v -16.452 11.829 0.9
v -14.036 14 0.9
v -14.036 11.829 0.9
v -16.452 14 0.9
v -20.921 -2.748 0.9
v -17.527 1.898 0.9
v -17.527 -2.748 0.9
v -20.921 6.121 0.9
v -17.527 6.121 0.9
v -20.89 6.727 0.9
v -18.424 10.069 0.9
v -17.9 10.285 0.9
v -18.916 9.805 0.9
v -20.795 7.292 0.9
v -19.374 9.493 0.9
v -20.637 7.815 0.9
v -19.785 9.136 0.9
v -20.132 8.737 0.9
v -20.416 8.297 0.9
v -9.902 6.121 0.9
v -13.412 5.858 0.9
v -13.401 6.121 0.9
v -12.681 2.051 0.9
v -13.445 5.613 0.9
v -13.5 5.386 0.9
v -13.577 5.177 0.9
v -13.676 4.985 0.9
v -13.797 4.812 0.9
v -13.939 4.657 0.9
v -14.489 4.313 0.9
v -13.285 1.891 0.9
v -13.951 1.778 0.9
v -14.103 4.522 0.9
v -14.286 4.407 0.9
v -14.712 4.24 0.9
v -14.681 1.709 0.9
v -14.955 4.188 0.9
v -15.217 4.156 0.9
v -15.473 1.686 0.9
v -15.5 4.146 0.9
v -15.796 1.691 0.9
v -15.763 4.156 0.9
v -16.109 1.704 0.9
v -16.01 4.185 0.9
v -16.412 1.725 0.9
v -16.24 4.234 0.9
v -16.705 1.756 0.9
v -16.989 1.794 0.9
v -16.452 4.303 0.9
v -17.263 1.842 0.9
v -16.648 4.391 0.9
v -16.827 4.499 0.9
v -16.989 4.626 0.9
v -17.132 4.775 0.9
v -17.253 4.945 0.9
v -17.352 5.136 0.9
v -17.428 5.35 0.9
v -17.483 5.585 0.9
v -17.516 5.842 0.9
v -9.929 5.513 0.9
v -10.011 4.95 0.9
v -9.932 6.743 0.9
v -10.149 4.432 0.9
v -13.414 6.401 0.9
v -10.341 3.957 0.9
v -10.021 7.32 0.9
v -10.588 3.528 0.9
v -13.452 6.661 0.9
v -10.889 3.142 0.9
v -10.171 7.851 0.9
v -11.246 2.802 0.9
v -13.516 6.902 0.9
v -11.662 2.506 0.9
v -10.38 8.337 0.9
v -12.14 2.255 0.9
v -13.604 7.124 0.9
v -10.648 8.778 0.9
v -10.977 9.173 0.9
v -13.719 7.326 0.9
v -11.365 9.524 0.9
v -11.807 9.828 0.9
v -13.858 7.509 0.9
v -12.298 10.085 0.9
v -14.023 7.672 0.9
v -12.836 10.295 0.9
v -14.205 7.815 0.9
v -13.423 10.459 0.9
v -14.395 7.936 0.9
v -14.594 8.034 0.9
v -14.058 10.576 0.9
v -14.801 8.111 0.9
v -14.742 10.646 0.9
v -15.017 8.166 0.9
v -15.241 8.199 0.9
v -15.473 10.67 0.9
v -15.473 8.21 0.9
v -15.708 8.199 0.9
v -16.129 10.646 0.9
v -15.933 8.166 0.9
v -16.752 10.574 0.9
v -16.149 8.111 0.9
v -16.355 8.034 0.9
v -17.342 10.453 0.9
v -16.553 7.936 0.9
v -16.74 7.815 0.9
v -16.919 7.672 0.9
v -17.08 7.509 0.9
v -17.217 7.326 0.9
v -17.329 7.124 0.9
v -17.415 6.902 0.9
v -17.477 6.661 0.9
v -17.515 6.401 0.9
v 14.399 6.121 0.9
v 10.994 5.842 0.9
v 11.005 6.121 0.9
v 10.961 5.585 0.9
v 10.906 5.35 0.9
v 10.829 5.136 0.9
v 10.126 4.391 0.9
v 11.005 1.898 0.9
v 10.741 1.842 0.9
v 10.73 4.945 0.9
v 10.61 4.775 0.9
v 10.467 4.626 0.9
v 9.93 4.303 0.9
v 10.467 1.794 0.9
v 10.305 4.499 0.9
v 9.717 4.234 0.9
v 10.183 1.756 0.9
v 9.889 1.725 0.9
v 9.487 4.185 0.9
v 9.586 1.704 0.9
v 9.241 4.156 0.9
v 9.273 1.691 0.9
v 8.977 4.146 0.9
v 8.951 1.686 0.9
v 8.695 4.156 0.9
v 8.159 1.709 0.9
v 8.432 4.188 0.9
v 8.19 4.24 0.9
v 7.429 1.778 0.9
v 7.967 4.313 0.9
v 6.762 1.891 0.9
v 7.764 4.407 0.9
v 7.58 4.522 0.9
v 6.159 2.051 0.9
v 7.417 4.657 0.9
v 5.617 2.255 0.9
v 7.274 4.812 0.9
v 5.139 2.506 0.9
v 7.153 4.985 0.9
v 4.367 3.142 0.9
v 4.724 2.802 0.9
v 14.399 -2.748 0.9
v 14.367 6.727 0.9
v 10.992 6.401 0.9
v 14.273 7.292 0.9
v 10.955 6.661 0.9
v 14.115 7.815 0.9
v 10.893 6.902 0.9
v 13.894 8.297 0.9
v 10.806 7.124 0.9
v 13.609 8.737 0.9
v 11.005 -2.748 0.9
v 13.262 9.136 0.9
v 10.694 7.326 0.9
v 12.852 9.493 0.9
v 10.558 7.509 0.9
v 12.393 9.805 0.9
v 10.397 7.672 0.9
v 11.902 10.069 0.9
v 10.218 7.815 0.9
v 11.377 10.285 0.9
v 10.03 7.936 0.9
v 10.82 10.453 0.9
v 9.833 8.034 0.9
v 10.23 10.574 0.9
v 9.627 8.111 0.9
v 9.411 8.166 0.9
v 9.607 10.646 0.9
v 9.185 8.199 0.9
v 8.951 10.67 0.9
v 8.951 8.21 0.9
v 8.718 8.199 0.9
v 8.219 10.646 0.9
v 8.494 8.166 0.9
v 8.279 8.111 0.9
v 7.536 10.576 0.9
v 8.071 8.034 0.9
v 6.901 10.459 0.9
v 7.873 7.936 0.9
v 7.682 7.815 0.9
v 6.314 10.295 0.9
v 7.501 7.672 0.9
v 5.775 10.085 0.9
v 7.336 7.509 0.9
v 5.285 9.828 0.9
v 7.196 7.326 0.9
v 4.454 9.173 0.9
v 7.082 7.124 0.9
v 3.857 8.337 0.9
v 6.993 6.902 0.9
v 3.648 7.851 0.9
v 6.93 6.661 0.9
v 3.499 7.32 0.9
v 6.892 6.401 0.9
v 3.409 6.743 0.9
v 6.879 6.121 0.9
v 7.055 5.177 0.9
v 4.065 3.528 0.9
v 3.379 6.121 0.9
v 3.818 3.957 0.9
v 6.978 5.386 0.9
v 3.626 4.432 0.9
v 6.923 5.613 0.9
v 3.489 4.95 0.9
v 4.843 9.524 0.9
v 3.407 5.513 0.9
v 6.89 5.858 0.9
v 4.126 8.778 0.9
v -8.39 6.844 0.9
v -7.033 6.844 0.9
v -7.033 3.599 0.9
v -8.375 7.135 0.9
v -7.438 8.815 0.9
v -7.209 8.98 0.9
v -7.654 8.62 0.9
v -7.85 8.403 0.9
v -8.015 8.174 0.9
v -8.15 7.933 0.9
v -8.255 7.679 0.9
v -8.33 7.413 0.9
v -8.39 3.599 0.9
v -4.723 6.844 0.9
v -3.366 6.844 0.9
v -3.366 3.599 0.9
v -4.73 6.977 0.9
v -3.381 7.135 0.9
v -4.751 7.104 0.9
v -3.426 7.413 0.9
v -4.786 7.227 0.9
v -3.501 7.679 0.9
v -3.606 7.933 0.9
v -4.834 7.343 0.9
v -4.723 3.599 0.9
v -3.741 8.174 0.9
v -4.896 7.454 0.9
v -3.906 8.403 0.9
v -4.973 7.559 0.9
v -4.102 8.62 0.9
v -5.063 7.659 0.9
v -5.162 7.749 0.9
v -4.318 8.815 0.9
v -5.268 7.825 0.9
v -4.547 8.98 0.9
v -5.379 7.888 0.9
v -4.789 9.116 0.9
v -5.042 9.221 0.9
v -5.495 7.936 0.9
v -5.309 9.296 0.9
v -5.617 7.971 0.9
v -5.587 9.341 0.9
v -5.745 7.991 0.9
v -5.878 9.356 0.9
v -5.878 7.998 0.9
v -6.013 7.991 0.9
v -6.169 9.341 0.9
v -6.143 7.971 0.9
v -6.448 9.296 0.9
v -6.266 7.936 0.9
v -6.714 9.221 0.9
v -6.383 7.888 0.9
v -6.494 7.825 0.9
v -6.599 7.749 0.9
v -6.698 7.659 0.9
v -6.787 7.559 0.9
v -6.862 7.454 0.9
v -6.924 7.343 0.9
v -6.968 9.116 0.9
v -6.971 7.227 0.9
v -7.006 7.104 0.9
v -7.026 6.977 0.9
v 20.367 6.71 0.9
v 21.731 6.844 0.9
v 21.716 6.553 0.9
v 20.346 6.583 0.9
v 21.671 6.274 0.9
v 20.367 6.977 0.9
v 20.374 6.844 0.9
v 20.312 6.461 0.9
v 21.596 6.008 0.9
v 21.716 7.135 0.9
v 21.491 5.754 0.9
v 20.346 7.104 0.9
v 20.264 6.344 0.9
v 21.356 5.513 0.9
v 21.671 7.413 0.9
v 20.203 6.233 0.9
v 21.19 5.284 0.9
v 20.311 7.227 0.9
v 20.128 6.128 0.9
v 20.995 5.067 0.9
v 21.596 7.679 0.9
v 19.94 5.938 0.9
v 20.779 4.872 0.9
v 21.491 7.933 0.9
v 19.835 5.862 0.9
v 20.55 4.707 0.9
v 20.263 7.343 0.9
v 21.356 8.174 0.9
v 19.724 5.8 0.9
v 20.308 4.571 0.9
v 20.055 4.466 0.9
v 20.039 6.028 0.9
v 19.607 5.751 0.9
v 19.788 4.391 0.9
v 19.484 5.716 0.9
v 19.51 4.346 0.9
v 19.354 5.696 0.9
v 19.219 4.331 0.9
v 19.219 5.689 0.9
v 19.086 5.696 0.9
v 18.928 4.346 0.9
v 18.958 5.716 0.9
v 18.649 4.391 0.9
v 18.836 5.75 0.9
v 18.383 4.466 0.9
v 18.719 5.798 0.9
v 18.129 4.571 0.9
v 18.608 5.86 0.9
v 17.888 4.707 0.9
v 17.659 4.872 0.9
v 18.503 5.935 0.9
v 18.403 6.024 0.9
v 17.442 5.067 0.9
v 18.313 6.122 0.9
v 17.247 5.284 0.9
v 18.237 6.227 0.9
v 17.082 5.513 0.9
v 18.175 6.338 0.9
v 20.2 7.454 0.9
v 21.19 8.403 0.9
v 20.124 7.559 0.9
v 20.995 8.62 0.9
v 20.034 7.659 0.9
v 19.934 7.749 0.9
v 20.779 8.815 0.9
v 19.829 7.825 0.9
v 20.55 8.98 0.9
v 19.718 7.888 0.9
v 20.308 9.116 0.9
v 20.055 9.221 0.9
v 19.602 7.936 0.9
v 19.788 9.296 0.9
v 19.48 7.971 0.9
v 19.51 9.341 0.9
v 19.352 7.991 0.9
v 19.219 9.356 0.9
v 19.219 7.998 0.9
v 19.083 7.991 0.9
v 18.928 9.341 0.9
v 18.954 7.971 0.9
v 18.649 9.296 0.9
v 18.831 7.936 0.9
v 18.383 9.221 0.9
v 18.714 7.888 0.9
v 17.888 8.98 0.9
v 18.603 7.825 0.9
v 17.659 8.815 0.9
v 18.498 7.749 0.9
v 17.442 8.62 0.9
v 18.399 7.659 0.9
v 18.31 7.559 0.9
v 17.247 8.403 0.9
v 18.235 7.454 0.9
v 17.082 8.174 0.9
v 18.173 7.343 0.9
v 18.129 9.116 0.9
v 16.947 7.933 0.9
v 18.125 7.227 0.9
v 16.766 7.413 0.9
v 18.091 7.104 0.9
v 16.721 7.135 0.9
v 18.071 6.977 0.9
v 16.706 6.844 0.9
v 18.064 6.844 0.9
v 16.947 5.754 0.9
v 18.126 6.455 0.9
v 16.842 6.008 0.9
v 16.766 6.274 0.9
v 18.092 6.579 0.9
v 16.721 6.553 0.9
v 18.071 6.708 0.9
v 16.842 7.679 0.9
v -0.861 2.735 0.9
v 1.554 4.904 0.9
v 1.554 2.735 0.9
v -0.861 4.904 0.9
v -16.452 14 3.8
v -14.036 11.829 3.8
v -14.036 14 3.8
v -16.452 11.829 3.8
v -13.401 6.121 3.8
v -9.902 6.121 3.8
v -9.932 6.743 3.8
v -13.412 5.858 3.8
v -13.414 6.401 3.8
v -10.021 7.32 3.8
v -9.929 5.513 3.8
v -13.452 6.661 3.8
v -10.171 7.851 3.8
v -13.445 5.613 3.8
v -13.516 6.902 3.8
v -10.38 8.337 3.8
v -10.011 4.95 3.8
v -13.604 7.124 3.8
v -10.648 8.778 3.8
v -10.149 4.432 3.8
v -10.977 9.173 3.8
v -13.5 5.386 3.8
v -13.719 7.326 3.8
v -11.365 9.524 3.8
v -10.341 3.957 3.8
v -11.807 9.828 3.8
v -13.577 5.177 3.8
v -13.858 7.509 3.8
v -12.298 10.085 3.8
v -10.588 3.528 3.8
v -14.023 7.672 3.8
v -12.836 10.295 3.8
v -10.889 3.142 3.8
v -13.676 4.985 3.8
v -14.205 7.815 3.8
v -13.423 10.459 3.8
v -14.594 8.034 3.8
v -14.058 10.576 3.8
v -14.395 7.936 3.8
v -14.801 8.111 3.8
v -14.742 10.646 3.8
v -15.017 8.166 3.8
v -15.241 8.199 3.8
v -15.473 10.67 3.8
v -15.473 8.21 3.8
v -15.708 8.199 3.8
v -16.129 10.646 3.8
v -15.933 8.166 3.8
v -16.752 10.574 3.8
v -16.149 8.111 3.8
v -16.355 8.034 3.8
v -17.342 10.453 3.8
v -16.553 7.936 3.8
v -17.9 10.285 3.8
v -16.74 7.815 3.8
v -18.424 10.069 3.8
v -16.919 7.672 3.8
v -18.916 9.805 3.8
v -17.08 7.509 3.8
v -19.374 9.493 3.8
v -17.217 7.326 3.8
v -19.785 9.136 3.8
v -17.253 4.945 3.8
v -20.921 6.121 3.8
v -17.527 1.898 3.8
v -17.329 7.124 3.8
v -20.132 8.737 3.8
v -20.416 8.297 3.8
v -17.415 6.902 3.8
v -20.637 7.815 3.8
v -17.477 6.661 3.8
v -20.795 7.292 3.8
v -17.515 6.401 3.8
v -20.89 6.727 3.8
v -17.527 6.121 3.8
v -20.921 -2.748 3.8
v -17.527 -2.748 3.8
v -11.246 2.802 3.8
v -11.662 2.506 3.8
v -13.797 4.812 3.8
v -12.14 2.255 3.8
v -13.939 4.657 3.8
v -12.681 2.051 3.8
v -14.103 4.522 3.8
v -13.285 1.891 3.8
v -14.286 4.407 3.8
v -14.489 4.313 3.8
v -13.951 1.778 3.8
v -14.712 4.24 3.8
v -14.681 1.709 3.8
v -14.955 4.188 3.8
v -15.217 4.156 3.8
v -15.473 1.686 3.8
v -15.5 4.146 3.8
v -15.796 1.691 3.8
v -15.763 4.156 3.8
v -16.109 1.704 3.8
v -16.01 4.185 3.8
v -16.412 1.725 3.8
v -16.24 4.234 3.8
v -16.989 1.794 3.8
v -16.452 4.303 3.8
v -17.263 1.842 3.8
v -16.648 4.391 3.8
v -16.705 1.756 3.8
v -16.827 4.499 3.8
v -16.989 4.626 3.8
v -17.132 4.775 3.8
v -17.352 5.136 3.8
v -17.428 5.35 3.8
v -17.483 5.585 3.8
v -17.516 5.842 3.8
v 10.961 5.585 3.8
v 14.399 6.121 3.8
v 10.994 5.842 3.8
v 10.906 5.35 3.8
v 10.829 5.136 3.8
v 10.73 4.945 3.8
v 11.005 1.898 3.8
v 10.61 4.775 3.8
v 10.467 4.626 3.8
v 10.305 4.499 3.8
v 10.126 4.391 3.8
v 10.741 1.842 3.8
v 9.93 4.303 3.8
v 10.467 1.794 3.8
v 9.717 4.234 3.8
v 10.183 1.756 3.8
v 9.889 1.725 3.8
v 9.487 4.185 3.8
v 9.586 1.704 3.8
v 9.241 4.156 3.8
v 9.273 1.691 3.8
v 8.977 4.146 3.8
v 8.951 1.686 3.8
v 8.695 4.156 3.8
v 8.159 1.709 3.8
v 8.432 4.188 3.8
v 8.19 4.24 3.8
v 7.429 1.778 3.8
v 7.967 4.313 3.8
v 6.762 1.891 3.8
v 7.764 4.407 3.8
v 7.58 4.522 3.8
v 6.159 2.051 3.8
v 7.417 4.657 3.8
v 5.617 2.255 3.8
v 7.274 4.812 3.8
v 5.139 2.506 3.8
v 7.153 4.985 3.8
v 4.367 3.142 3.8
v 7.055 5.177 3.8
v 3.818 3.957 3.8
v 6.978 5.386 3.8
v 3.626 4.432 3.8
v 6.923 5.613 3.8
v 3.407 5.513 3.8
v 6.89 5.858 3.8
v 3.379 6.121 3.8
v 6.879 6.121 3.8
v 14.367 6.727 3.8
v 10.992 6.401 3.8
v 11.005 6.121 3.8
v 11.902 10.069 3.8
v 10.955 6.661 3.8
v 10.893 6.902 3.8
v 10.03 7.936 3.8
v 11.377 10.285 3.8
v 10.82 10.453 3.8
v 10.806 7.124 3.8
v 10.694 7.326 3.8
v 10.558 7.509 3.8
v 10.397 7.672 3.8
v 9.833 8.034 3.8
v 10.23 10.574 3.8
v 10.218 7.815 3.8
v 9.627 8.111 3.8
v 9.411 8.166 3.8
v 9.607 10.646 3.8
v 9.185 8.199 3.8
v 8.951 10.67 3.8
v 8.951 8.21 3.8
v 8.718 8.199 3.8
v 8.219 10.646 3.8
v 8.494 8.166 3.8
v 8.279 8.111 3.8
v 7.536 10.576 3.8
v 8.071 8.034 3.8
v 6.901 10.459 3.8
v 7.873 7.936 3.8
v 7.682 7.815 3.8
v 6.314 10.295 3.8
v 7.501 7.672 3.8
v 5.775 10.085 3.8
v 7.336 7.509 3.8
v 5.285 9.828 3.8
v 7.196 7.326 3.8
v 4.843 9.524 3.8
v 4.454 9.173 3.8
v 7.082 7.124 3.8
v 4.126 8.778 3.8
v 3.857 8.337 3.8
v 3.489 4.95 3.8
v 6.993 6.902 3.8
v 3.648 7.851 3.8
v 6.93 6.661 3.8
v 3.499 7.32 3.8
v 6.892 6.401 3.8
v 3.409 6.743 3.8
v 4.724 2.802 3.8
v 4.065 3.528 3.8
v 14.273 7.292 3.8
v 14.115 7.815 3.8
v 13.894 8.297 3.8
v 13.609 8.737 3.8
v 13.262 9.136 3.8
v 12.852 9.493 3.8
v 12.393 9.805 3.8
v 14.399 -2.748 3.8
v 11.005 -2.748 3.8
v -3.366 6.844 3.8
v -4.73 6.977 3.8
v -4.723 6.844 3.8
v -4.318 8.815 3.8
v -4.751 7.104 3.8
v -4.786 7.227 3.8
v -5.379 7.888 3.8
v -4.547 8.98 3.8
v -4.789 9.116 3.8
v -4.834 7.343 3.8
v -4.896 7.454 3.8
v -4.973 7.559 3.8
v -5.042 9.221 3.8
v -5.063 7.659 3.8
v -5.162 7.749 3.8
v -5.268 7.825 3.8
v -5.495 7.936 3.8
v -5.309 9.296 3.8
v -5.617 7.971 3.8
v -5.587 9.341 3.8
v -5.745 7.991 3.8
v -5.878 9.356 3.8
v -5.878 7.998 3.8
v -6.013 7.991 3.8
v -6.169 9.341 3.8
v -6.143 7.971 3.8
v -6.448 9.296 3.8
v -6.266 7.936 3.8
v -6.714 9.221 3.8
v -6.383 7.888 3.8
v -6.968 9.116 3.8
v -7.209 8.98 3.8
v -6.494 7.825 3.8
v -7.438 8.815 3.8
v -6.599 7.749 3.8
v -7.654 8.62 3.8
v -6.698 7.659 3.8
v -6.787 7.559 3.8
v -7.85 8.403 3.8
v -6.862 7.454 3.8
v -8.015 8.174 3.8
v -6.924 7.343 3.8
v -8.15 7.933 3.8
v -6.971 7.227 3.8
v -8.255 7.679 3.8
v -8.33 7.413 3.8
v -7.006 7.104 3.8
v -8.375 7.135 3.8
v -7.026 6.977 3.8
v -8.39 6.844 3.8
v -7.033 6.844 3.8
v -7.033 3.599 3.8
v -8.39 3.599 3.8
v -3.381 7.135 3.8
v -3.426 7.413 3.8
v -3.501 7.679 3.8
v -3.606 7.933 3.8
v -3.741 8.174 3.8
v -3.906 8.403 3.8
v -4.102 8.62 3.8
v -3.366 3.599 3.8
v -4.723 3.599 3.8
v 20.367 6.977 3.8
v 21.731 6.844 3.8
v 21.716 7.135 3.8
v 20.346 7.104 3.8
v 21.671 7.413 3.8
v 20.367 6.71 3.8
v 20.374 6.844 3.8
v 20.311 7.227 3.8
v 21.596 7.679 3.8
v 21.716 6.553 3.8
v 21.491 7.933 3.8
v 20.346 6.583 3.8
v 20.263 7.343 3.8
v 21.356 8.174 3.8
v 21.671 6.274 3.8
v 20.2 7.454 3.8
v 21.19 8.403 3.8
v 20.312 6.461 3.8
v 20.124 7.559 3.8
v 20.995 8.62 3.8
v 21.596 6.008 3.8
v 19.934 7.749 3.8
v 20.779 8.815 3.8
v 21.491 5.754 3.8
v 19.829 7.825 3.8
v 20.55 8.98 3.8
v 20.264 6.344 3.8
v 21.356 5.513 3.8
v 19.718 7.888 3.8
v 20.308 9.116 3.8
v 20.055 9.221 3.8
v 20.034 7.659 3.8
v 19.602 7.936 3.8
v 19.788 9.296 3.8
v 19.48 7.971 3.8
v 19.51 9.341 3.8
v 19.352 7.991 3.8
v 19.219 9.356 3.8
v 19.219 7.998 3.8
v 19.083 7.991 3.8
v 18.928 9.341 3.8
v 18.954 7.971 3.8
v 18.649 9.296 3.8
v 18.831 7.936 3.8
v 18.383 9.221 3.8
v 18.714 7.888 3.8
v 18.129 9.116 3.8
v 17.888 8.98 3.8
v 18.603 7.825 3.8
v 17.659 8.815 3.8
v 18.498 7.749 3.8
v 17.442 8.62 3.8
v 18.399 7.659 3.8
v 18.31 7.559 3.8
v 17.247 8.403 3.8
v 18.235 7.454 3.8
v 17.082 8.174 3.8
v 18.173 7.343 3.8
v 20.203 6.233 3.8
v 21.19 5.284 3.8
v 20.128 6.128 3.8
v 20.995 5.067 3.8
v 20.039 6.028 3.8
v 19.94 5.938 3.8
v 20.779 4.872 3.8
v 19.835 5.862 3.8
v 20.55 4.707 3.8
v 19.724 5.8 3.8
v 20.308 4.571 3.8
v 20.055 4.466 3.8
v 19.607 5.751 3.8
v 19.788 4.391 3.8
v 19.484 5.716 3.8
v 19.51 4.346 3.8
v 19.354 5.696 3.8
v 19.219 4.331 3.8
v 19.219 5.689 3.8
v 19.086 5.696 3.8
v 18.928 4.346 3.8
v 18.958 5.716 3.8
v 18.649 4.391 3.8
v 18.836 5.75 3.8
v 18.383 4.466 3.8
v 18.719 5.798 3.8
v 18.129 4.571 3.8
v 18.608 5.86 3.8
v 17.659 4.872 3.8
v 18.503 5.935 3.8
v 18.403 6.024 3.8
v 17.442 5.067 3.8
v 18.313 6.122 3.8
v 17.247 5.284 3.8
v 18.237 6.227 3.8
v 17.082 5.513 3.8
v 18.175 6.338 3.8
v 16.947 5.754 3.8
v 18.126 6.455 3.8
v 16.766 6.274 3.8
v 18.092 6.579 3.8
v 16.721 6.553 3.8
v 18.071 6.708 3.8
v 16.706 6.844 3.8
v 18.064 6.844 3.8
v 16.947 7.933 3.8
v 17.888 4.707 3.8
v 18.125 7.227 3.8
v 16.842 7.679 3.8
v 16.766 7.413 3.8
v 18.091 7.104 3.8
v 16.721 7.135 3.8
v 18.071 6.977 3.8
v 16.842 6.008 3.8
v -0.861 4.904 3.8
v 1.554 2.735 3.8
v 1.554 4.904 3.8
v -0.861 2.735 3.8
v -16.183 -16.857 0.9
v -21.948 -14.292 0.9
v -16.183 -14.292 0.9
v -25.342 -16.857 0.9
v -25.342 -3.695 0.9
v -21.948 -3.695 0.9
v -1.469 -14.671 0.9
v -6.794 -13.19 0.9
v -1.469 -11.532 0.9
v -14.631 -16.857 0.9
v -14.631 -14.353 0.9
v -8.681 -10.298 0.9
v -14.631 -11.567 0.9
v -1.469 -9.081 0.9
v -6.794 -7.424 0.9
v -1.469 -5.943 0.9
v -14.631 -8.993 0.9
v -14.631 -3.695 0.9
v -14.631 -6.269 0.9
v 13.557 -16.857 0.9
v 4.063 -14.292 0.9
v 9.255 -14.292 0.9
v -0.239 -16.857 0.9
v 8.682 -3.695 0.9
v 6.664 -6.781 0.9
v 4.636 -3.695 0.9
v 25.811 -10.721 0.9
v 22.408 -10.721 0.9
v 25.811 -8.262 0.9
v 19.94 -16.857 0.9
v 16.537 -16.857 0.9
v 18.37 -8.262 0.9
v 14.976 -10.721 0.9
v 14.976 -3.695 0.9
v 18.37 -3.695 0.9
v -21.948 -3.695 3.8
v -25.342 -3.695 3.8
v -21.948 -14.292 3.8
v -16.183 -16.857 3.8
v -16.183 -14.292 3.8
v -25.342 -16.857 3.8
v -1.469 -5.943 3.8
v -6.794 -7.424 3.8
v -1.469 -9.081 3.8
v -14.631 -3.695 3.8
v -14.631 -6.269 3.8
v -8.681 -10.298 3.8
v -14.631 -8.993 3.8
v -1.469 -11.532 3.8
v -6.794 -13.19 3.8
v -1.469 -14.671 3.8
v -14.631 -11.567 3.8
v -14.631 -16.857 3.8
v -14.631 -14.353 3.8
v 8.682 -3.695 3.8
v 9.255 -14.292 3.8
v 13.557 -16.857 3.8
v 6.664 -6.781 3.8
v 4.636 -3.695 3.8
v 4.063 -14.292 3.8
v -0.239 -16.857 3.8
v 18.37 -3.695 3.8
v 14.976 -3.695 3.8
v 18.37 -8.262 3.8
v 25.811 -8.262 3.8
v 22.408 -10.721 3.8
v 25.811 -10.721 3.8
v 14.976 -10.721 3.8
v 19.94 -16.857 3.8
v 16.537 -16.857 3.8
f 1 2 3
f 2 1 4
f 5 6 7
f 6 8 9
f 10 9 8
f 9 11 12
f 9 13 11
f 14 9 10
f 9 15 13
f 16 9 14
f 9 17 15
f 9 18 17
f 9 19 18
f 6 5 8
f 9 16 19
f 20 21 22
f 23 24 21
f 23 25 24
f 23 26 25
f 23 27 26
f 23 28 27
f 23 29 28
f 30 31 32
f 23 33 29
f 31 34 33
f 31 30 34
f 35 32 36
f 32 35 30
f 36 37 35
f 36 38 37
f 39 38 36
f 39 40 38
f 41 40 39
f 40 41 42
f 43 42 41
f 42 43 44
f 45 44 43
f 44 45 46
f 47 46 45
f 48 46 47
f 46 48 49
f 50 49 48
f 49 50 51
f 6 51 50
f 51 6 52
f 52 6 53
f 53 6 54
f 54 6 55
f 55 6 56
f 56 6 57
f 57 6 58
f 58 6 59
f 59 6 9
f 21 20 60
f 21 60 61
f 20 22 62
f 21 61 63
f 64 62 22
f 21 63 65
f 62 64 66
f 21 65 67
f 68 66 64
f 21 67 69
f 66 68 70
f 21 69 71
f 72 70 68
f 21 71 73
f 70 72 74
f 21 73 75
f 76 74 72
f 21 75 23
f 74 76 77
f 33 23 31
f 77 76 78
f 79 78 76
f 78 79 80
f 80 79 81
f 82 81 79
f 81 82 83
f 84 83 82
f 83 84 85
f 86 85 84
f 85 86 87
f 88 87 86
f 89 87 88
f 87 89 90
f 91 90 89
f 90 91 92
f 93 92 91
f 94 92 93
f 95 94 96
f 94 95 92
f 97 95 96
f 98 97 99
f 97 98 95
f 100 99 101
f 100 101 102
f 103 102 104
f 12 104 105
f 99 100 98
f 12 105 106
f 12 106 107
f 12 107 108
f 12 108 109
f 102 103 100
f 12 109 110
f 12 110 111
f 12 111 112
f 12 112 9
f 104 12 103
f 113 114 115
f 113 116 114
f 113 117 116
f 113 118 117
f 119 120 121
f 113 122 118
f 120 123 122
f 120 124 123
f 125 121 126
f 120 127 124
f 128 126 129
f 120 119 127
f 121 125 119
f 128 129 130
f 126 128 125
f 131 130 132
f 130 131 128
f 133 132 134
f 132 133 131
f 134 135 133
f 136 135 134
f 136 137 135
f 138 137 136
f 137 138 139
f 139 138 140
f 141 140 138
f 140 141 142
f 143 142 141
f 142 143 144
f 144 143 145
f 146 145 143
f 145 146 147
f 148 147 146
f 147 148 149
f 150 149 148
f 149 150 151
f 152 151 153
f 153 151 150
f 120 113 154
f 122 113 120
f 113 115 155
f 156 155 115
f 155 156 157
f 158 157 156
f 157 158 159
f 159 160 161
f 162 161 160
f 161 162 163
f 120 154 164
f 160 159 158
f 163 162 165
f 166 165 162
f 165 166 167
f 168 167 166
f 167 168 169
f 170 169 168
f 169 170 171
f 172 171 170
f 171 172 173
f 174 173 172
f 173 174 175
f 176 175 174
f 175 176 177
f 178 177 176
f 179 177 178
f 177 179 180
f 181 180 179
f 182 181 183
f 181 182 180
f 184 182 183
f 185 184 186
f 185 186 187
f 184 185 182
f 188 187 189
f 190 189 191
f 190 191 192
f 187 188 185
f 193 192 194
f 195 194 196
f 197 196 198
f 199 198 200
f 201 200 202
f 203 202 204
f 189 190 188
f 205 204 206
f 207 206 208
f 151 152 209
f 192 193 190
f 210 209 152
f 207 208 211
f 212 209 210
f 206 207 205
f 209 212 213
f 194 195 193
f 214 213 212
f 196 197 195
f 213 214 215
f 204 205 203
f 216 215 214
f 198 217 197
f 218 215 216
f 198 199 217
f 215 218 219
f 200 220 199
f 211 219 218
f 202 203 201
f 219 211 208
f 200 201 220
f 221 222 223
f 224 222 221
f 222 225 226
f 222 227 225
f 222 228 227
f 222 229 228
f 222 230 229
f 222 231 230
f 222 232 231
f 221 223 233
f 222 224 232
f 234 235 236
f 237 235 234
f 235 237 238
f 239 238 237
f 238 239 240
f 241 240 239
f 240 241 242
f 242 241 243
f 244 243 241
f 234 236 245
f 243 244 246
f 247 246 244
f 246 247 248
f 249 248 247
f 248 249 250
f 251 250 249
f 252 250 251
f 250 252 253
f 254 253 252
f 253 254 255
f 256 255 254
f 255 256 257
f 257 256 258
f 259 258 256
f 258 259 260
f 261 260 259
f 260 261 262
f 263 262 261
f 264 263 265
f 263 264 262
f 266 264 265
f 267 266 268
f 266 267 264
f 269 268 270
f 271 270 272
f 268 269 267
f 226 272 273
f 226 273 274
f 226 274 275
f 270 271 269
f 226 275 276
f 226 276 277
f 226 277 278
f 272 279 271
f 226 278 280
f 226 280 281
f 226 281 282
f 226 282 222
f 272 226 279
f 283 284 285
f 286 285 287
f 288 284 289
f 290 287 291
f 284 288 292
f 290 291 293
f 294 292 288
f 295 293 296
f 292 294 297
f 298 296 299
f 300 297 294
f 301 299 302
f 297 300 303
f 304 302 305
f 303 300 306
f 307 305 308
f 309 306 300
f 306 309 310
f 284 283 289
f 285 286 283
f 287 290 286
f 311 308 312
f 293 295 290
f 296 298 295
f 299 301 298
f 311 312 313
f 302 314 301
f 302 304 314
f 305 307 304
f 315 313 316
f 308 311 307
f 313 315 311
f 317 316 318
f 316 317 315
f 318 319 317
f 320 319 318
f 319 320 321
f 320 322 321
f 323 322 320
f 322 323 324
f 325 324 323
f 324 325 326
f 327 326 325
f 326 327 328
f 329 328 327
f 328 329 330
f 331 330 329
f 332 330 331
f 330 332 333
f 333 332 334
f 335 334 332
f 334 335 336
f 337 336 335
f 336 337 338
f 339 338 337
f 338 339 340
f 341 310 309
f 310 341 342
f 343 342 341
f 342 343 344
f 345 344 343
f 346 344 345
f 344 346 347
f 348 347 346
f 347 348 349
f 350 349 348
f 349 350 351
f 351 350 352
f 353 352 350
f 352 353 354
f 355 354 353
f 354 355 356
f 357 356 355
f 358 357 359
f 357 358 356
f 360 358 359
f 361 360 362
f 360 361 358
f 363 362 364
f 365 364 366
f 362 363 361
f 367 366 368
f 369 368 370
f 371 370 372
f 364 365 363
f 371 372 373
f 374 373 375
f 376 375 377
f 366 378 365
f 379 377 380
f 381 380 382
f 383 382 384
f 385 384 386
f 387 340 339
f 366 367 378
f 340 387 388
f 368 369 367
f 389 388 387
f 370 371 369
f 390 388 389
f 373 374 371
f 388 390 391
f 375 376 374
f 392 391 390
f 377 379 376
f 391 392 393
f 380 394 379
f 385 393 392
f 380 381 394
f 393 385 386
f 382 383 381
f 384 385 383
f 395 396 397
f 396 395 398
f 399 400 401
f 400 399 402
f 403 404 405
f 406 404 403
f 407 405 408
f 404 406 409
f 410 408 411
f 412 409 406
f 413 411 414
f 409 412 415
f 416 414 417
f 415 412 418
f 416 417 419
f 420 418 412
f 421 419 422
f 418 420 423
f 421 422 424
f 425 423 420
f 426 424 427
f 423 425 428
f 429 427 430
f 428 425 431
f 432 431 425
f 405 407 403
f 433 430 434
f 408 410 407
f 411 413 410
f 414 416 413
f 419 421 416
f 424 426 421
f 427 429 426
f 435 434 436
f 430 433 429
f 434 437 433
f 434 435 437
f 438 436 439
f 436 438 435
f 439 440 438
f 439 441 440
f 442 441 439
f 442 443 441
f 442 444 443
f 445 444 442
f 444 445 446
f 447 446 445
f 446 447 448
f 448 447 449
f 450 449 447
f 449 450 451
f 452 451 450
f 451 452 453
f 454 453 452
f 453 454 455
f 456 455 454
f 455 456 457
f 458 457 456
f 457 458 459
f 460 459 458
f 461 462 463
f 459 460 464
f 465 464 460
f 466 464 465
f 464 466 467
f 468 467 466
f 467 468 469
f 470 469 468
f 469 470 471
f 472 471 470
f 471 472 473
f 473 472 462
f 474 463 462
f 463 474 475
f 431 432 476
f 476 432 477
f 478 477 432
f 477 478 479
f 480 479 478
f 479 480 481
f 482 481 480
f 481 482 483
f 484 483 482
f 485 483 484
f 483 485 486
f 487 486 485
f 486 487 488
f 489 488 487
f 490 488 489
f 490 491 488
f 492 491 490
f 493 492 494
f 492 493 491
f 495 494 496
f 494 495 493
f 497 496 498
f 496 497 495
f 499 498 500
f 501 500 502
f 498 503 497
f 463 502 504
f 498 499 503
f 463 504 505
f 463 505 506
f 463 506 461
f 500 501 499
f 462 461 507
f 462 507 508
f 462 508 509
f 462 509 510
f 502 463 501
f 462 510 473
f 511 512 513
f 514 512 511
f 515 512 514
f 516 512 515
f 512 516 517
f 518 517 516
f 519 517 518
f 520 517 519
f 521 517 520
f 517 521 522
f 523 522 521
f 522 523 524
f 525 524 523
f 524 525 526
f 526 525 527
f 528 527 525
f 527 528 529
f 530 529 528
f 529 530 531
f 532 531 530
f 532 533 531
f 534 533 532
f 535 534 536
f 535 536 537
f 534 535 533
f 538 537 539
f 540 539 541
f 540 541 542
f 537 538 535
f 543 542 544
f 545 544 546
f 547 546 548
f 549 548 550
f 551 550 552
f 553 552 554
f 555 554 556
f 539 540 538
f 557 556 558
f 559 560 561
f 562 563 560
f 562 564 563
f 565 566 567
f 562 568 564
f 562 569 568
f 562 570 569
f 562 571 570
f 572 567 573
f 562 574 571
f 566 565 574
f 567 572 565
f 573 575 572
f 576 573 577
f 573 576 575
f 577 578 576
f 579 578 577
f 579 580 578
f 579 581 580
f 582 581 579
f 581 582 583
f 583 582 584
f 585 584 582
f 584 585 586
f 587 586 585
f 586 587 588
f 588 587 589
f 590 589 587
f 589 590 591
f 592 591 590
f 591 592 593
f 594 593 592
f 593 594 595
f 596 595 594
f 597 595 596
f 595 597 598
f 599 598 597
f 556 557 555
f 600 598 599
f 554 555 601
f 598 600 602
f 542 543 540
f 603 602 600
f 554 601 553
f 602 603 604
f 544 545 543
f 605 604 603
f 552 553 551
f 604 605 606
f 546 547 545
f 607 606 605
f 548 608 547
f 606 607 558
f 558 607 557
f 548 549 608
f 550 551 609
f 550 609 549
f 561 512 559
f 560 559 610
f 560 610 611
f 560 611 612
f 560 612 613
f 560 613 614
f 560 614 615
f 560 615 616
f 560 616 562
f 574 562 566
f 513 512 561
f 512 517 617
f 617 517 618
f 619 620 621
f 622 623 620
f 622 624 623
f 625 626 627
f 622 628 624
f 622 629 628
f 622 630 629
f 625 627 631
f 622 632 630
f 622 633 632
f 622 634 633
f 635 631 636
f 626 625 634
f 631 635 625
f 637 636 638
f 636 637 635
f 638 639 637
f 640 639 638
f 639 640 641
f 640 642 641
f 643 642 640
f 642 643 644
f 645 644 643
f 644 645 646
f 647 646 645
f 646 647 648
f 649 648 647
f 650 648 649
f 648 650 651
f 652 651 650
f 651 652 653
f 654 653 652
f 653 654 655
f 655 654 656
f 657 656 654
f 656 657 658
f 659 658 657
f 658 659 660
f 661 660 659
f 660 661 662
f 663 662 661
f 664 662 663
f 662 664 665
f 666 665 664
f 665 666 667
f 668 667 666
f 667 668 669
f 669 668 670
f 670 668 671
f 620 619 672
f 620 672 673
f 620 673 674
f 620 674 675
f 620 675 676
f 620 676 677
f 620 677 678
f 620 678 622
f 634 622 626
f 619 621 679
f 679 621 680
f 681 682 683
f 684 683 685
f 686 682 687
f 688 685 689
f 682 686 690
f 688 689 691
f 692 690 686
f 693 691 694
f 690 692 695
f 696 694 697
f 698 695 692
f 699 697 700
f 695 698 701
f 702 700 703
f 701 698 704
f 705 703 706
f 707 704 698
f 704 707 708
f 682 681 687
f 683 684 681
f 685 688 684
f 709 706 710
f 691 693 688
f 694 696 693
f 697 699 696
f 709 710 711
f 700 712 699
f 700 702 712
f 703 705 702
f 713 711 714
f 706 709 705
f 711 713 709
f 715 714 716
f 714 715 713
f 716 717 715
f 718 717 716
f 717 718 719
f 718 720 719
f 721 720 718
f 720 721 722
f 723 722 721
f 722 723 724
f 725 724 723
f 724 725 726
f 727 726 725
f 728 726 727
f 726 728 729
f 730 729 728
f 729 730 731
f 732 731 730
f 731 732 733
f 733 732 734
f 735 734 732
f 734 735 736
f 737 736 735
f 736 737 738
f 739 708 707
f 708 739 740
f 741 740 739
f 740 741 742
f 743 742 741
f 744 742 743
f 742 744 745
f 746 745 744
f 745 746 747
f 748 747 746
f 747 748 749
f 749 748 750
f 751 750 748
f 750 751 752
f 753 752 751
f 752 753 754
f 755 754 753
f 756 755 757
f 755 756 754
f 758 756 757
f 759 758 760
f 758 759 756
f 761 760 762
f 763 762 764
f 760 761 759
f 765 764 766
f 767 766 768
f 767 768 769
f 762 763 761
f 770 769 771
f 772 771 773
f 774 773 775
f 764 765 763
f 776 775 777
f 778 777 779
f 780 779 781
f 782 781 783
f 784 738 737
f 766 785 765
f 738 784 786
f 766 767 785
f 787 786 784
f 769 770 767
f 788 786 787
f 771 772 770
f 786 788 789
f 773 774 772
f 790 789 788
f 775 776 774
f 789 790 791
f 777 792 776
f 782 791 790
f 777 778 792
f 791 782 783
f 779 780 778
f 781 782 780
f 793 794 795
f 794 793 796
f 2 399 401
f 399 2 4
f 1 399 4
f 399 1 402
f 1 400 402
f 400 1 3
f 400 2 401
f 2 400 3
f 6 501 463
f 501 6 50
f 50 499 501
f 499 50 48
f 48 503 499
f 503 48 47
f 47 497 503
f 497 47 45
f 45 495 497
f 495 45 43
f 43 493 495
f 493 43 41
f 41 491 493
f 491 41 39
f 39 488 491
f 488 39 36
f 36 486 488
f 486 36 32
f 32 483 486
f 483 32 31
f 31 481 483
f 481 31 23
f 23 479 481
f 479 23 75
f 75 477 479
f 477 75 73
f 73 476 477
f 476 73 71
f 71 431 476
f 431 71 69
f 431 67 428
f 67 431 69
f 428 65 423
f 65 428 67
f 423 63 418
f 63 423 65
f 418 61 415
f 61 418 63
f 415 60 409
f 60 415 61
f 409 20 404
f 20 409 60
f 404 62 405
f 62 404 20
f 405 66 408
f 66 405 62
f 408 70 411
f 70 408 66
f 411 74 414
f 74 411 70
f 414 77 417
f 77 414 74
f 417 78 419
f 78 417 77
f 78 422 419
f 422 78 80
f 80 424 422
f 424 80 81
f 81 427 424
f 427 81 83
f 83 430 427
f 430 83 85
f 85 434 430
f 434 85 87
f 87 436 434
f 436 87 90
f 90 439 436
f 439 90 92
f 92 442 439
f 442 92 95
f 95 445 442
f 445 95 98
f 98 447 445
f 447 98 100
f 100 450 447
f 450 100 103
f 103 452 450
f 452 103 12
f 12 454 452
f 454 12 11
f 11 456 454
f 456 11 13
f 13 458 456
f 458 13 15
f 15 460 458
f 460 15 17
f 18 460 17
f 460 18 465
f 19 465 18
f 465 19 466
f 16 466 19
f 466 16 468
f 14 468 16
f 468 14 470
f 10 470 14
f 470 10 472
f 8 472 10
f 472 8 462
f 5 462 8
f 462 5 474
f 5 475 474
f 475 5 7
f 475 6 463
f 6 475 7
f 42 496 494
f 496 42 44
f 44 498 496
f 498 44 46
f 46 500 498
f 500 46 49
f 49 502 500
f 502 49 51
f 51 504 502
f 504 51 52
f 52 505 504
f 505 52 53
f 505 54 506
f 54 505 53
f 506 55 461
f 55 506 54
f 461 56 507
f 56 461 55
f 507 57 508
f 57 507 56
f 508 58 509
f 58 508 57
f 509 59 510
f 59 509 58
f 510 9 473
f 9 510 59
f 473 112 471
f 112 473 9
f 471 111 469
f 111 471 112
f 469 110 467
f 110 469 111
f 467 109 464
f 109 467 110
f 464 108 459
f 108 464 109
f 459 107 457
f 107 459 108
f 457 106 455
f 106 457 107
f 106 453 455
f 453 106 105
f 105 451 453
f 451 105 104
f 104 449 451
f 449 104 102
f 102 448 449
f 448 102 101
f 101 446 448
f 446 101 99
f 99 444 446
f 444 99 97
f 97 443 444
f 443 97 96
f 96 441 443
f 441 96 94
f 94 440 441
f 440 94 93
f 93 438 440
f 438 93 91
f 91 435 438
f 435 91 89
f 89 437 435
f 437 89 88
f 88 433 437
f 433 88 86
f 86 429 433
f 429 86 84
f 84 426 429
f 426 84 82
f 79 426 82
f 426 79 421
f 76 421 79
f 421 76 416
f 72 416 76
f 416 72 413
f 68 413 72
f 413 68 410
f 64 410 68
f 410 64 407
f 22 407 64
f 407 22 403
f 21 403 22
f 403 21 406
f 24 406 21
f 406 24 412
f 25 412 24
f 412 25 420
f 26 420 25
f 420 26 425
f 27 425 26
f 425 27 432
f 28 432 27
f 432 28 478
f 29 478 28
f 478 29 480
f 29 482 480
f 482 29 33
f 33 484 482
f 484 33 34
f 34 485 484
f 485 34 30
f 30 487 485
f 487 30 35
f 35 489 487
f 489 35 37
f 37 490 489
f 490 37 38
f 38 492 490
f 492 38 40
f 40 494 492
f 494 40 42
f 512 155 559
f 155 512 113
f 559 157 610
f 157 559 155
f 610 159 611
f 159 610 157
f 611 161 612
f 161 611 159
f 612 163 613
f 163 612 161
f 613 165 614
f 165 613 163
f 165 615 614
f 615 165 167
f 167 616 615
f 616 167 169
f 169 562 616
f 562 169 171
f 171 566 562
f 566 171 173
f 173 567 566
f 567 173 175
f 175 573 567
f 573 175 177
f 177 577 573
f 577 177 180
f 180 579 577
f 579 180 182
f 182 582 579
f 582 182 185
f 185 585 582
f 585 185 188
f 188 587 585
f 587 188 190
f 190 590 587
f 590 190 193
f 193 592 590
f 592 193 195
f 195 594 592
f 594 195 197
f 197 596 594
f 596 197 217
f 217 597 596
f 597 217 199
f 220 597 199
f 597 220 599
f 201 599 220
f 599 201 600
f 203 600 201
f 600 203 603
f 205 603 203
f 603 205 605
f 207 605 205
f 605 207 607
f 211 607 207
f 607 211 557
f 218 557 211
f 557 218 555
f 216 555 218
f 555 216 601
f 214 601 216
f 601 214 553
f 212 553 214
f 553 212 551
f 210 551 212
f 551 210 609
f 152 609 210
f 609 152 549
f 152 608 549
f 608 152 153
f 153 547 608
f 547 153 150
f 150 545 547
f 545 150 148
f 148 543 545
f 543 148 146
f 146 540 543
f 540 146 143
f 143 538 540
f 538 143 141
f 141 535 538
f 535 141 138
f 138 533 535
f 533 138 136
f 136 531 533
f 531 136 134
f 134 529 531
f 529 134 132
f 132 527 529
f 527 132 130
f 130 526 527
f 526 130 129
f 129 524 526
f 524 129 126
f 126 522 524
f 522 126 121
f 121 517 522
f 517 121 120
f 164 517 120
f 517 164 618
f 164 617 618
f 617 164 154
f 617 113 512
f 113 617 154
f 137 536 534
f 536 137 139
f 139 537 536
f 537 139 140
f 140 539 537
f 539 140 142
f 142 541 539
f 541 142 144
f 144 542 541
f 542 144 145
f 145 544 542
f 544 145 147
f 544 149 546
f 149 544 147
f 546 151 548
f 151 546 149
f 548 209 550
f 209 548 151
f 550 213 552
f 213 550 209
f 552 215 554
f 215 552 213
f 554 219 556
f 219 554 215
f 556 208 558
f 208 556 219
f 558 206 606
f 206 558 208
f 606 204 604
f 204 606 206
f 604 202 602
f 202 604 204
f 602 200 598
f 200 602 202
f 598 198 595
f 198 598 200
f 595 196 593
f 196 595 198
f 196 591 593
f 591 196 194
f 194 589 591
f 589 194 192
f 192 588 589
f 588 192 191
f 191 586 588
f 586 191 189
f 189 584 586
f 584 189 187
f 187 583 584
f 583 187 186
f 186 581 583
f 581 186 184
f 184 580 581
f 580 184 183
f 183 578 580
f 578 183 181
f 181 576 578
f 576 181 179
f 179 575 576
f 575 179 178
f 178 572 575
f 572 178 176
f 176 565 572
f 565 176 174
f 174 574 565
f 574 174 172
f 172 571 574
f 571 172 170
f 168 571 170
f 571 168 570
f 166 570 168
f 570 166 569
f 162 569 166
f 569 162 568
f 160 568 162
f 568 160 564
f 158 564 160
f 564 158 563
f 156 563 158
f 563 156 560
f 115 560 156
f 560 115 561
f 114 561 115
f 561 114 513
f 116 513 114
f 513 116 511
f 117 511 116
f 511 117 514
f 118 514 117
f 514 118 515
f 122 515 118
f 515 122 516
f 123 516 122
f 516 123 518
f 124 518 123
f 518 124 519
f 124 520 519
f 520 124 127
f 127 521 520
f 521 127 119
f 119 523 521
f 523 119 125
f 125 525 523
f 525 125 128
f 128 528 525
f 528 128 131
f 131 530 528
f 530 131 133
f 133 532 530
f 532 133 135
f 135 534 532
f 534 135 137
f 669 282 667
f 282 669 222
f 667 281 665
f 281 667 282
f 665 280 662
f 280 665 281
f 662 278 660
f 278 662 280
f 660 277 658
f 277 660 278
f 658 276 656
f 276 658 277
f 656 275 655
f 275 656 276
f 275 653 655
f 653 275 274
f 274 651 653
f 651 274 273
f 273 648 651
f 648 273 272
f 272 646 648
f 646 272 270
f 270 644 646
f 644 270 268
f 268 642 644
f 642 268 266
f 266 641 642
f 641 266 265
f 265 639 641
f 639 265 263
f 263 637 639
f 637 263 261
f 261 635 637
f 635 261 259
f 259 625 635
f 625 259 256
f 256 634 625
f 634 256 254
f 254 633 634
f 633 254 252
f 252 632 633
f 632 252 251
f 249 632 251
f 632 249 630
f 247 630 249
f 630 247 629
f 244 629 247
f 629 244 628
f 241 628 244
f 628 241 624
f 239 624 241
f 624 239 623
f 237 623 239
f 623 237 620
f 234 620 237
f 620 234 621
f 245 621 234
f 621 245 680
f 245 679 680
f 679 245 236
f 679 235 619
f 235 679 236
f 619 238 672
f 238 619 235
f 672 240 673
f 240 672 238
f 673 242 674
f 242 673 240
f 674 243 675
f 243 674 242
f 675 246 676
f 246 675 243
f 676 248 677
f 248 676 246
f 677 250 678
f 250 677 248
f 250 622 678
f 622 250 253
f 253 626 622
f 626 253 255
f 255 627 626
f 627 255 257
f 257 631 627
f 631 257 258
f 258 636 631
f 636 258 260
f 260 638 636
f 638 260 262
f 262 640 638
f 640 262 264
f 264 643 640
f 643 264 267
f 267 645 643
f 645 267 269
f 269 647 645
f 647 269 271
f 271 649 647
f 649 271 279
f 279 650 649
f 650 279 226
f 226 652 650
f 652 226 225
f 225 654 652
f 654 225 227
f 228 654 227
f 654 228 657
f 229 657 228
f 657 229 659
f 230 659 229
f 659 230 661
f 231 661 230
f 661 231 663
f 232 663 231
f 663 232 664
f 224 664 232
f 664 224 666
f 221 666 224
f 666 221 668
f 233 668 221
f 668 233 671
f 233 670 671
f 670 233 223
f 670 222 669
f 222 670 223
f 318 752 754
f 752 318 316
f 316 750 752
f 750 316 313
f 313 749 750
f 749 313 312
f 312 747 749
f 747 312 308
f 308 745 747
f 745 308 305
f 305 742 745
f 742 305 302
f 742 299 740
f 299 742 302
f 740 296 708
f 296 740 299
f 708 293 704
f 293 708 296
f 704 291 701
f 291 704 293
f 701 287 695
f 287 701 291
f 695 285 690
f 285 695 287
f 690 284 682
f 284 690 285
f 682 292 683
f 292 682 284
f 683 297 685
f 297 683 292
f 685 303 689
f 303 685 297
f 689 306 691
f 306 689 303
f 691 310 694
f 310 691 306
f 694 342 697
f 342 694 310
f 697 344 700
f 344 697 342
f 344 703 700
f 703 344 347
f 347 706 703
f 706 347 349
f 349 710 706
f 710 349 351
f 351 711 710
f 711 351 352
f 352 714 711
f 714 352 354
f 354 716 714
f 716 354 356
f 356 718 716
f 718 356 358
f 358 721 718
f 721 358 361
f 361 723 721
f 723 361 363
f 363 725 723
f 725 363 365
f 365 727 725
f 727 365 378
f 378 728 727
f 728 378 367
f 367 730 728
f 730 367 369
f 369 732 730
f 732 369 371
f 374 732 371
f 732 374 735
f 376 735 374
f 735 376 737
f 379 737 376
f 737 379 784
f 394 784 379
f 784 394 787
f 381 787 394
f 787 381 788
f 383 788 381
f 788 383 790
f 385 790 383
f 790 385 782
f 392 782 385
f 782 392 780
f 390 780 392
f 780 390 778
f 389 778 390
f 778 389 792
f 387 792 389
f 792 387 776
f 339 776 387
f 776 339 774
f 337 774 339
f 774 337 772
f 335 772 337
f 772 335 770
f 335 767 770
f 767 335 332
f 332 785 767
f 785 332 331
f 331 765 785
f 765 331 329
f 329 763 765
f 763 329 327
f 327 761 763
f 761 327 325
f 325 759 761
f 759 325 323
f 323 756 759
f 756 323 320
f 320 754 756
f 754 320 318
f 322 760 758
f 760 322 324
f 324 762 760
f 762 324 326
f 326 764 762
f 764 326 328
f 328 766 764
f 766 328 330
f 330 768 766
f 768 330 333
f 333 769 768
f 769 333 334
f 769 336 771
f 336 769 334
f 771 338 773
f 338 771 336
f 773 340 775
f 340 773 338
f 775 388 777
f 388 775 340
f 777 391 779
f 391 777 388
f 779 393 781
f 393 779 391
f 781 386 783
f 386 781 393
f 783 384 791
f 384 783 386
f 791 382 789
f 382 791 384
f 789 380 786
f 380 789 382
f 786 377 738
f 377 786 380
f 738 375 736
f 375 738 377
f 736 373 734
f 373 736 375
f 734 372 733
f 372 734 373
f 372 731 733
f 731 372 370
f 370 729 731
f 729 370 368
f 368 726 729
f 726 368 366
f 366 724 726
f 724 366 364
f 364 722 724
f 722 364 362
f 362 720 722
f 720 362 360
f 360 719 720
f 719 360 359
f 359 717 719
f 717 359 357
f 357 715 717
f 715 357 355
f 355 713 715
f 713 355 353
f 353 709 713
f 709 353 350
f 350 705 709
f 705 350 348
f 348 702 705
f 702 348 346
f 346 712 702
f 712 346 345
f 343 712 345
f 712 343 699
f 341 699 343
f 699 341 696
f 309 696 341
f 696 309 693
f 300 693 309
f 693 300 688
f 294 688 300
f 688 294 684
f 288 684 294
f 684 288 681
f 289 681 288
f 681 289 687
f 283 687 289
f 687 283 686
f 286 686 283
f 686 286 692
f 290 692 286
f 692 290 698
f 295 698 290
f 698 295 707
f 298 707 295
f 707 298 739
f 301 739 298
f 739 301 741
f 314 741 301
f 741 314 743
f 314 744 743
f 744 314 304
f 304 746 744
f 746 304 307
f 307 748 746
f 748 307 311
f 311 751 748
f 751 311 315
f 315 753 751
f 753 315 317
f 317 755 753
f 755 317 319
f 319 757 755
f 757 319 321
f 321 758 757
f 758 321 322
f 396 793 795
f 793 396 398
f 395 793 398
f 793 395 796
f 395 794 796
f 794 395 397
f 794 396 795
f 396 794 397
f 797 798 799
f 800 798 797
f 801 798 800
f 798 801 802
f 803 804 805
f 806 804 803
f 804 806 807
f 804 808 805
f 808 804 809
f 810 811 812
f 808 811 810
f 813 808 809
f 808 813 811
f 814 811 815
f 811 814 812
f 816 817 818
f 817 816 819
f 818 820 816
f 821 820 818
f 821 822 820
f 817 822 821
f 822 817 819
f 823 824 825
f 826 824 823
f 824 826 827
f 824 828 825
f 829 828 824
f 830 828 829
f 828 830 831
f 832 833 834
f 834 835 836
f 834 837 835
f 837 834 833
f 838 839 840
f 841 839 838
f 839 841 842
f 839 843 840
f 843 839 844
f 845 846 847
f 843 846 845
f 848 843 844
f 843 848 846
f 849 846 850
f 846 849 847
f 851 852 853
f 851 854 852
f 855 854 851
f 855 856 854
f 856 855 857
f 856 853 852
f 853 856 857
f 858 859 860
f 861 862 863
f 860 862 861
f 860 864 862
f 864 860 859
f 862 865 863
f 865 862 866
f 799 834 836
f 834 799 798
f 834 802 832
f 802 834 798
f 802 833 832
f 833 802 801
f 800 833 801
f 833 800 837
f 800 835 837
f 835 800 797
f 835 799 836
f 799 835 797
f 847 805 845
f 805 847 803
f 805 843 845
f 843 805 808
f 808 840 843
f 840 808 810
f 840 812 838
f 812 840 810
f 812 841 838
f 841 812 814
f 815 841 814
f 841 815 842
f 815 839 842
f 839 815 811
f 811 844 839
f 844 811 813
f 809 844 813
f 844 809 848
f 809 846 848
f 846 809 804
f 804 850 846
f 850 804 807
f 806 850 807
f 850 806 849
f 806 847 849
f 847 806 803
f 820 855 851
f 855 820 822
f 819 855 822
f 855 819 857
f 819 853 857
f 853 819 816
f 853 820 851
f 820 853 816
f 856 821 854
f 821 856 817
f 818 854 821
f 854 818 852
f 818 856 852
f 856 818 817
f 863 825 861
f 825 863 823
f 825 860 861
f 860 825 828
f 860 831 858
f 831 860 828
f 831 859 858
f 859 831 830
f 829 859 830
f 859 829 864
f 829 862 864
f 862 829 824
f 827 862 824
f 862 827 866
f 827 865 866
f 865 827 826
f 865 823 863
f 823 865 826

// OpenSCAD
$fn = 48;
  // syllabics (overlaid on icon, tallest)
  translate([0, 5.430, 0.900]) linear_extrude(height=2.900) text("ᑮᐢᑴᐤ", size=13.000, halign="center", valign="center", font="Euphemia UCAS:style=Bold");
  translate([0, -10.430, 0.900]) linear_extrude(height=2.900) text("ᒪᕒᐃᔭ", size=13.000, halign="center", valign="center", font="Euphemia UCAS:style=Bold");
